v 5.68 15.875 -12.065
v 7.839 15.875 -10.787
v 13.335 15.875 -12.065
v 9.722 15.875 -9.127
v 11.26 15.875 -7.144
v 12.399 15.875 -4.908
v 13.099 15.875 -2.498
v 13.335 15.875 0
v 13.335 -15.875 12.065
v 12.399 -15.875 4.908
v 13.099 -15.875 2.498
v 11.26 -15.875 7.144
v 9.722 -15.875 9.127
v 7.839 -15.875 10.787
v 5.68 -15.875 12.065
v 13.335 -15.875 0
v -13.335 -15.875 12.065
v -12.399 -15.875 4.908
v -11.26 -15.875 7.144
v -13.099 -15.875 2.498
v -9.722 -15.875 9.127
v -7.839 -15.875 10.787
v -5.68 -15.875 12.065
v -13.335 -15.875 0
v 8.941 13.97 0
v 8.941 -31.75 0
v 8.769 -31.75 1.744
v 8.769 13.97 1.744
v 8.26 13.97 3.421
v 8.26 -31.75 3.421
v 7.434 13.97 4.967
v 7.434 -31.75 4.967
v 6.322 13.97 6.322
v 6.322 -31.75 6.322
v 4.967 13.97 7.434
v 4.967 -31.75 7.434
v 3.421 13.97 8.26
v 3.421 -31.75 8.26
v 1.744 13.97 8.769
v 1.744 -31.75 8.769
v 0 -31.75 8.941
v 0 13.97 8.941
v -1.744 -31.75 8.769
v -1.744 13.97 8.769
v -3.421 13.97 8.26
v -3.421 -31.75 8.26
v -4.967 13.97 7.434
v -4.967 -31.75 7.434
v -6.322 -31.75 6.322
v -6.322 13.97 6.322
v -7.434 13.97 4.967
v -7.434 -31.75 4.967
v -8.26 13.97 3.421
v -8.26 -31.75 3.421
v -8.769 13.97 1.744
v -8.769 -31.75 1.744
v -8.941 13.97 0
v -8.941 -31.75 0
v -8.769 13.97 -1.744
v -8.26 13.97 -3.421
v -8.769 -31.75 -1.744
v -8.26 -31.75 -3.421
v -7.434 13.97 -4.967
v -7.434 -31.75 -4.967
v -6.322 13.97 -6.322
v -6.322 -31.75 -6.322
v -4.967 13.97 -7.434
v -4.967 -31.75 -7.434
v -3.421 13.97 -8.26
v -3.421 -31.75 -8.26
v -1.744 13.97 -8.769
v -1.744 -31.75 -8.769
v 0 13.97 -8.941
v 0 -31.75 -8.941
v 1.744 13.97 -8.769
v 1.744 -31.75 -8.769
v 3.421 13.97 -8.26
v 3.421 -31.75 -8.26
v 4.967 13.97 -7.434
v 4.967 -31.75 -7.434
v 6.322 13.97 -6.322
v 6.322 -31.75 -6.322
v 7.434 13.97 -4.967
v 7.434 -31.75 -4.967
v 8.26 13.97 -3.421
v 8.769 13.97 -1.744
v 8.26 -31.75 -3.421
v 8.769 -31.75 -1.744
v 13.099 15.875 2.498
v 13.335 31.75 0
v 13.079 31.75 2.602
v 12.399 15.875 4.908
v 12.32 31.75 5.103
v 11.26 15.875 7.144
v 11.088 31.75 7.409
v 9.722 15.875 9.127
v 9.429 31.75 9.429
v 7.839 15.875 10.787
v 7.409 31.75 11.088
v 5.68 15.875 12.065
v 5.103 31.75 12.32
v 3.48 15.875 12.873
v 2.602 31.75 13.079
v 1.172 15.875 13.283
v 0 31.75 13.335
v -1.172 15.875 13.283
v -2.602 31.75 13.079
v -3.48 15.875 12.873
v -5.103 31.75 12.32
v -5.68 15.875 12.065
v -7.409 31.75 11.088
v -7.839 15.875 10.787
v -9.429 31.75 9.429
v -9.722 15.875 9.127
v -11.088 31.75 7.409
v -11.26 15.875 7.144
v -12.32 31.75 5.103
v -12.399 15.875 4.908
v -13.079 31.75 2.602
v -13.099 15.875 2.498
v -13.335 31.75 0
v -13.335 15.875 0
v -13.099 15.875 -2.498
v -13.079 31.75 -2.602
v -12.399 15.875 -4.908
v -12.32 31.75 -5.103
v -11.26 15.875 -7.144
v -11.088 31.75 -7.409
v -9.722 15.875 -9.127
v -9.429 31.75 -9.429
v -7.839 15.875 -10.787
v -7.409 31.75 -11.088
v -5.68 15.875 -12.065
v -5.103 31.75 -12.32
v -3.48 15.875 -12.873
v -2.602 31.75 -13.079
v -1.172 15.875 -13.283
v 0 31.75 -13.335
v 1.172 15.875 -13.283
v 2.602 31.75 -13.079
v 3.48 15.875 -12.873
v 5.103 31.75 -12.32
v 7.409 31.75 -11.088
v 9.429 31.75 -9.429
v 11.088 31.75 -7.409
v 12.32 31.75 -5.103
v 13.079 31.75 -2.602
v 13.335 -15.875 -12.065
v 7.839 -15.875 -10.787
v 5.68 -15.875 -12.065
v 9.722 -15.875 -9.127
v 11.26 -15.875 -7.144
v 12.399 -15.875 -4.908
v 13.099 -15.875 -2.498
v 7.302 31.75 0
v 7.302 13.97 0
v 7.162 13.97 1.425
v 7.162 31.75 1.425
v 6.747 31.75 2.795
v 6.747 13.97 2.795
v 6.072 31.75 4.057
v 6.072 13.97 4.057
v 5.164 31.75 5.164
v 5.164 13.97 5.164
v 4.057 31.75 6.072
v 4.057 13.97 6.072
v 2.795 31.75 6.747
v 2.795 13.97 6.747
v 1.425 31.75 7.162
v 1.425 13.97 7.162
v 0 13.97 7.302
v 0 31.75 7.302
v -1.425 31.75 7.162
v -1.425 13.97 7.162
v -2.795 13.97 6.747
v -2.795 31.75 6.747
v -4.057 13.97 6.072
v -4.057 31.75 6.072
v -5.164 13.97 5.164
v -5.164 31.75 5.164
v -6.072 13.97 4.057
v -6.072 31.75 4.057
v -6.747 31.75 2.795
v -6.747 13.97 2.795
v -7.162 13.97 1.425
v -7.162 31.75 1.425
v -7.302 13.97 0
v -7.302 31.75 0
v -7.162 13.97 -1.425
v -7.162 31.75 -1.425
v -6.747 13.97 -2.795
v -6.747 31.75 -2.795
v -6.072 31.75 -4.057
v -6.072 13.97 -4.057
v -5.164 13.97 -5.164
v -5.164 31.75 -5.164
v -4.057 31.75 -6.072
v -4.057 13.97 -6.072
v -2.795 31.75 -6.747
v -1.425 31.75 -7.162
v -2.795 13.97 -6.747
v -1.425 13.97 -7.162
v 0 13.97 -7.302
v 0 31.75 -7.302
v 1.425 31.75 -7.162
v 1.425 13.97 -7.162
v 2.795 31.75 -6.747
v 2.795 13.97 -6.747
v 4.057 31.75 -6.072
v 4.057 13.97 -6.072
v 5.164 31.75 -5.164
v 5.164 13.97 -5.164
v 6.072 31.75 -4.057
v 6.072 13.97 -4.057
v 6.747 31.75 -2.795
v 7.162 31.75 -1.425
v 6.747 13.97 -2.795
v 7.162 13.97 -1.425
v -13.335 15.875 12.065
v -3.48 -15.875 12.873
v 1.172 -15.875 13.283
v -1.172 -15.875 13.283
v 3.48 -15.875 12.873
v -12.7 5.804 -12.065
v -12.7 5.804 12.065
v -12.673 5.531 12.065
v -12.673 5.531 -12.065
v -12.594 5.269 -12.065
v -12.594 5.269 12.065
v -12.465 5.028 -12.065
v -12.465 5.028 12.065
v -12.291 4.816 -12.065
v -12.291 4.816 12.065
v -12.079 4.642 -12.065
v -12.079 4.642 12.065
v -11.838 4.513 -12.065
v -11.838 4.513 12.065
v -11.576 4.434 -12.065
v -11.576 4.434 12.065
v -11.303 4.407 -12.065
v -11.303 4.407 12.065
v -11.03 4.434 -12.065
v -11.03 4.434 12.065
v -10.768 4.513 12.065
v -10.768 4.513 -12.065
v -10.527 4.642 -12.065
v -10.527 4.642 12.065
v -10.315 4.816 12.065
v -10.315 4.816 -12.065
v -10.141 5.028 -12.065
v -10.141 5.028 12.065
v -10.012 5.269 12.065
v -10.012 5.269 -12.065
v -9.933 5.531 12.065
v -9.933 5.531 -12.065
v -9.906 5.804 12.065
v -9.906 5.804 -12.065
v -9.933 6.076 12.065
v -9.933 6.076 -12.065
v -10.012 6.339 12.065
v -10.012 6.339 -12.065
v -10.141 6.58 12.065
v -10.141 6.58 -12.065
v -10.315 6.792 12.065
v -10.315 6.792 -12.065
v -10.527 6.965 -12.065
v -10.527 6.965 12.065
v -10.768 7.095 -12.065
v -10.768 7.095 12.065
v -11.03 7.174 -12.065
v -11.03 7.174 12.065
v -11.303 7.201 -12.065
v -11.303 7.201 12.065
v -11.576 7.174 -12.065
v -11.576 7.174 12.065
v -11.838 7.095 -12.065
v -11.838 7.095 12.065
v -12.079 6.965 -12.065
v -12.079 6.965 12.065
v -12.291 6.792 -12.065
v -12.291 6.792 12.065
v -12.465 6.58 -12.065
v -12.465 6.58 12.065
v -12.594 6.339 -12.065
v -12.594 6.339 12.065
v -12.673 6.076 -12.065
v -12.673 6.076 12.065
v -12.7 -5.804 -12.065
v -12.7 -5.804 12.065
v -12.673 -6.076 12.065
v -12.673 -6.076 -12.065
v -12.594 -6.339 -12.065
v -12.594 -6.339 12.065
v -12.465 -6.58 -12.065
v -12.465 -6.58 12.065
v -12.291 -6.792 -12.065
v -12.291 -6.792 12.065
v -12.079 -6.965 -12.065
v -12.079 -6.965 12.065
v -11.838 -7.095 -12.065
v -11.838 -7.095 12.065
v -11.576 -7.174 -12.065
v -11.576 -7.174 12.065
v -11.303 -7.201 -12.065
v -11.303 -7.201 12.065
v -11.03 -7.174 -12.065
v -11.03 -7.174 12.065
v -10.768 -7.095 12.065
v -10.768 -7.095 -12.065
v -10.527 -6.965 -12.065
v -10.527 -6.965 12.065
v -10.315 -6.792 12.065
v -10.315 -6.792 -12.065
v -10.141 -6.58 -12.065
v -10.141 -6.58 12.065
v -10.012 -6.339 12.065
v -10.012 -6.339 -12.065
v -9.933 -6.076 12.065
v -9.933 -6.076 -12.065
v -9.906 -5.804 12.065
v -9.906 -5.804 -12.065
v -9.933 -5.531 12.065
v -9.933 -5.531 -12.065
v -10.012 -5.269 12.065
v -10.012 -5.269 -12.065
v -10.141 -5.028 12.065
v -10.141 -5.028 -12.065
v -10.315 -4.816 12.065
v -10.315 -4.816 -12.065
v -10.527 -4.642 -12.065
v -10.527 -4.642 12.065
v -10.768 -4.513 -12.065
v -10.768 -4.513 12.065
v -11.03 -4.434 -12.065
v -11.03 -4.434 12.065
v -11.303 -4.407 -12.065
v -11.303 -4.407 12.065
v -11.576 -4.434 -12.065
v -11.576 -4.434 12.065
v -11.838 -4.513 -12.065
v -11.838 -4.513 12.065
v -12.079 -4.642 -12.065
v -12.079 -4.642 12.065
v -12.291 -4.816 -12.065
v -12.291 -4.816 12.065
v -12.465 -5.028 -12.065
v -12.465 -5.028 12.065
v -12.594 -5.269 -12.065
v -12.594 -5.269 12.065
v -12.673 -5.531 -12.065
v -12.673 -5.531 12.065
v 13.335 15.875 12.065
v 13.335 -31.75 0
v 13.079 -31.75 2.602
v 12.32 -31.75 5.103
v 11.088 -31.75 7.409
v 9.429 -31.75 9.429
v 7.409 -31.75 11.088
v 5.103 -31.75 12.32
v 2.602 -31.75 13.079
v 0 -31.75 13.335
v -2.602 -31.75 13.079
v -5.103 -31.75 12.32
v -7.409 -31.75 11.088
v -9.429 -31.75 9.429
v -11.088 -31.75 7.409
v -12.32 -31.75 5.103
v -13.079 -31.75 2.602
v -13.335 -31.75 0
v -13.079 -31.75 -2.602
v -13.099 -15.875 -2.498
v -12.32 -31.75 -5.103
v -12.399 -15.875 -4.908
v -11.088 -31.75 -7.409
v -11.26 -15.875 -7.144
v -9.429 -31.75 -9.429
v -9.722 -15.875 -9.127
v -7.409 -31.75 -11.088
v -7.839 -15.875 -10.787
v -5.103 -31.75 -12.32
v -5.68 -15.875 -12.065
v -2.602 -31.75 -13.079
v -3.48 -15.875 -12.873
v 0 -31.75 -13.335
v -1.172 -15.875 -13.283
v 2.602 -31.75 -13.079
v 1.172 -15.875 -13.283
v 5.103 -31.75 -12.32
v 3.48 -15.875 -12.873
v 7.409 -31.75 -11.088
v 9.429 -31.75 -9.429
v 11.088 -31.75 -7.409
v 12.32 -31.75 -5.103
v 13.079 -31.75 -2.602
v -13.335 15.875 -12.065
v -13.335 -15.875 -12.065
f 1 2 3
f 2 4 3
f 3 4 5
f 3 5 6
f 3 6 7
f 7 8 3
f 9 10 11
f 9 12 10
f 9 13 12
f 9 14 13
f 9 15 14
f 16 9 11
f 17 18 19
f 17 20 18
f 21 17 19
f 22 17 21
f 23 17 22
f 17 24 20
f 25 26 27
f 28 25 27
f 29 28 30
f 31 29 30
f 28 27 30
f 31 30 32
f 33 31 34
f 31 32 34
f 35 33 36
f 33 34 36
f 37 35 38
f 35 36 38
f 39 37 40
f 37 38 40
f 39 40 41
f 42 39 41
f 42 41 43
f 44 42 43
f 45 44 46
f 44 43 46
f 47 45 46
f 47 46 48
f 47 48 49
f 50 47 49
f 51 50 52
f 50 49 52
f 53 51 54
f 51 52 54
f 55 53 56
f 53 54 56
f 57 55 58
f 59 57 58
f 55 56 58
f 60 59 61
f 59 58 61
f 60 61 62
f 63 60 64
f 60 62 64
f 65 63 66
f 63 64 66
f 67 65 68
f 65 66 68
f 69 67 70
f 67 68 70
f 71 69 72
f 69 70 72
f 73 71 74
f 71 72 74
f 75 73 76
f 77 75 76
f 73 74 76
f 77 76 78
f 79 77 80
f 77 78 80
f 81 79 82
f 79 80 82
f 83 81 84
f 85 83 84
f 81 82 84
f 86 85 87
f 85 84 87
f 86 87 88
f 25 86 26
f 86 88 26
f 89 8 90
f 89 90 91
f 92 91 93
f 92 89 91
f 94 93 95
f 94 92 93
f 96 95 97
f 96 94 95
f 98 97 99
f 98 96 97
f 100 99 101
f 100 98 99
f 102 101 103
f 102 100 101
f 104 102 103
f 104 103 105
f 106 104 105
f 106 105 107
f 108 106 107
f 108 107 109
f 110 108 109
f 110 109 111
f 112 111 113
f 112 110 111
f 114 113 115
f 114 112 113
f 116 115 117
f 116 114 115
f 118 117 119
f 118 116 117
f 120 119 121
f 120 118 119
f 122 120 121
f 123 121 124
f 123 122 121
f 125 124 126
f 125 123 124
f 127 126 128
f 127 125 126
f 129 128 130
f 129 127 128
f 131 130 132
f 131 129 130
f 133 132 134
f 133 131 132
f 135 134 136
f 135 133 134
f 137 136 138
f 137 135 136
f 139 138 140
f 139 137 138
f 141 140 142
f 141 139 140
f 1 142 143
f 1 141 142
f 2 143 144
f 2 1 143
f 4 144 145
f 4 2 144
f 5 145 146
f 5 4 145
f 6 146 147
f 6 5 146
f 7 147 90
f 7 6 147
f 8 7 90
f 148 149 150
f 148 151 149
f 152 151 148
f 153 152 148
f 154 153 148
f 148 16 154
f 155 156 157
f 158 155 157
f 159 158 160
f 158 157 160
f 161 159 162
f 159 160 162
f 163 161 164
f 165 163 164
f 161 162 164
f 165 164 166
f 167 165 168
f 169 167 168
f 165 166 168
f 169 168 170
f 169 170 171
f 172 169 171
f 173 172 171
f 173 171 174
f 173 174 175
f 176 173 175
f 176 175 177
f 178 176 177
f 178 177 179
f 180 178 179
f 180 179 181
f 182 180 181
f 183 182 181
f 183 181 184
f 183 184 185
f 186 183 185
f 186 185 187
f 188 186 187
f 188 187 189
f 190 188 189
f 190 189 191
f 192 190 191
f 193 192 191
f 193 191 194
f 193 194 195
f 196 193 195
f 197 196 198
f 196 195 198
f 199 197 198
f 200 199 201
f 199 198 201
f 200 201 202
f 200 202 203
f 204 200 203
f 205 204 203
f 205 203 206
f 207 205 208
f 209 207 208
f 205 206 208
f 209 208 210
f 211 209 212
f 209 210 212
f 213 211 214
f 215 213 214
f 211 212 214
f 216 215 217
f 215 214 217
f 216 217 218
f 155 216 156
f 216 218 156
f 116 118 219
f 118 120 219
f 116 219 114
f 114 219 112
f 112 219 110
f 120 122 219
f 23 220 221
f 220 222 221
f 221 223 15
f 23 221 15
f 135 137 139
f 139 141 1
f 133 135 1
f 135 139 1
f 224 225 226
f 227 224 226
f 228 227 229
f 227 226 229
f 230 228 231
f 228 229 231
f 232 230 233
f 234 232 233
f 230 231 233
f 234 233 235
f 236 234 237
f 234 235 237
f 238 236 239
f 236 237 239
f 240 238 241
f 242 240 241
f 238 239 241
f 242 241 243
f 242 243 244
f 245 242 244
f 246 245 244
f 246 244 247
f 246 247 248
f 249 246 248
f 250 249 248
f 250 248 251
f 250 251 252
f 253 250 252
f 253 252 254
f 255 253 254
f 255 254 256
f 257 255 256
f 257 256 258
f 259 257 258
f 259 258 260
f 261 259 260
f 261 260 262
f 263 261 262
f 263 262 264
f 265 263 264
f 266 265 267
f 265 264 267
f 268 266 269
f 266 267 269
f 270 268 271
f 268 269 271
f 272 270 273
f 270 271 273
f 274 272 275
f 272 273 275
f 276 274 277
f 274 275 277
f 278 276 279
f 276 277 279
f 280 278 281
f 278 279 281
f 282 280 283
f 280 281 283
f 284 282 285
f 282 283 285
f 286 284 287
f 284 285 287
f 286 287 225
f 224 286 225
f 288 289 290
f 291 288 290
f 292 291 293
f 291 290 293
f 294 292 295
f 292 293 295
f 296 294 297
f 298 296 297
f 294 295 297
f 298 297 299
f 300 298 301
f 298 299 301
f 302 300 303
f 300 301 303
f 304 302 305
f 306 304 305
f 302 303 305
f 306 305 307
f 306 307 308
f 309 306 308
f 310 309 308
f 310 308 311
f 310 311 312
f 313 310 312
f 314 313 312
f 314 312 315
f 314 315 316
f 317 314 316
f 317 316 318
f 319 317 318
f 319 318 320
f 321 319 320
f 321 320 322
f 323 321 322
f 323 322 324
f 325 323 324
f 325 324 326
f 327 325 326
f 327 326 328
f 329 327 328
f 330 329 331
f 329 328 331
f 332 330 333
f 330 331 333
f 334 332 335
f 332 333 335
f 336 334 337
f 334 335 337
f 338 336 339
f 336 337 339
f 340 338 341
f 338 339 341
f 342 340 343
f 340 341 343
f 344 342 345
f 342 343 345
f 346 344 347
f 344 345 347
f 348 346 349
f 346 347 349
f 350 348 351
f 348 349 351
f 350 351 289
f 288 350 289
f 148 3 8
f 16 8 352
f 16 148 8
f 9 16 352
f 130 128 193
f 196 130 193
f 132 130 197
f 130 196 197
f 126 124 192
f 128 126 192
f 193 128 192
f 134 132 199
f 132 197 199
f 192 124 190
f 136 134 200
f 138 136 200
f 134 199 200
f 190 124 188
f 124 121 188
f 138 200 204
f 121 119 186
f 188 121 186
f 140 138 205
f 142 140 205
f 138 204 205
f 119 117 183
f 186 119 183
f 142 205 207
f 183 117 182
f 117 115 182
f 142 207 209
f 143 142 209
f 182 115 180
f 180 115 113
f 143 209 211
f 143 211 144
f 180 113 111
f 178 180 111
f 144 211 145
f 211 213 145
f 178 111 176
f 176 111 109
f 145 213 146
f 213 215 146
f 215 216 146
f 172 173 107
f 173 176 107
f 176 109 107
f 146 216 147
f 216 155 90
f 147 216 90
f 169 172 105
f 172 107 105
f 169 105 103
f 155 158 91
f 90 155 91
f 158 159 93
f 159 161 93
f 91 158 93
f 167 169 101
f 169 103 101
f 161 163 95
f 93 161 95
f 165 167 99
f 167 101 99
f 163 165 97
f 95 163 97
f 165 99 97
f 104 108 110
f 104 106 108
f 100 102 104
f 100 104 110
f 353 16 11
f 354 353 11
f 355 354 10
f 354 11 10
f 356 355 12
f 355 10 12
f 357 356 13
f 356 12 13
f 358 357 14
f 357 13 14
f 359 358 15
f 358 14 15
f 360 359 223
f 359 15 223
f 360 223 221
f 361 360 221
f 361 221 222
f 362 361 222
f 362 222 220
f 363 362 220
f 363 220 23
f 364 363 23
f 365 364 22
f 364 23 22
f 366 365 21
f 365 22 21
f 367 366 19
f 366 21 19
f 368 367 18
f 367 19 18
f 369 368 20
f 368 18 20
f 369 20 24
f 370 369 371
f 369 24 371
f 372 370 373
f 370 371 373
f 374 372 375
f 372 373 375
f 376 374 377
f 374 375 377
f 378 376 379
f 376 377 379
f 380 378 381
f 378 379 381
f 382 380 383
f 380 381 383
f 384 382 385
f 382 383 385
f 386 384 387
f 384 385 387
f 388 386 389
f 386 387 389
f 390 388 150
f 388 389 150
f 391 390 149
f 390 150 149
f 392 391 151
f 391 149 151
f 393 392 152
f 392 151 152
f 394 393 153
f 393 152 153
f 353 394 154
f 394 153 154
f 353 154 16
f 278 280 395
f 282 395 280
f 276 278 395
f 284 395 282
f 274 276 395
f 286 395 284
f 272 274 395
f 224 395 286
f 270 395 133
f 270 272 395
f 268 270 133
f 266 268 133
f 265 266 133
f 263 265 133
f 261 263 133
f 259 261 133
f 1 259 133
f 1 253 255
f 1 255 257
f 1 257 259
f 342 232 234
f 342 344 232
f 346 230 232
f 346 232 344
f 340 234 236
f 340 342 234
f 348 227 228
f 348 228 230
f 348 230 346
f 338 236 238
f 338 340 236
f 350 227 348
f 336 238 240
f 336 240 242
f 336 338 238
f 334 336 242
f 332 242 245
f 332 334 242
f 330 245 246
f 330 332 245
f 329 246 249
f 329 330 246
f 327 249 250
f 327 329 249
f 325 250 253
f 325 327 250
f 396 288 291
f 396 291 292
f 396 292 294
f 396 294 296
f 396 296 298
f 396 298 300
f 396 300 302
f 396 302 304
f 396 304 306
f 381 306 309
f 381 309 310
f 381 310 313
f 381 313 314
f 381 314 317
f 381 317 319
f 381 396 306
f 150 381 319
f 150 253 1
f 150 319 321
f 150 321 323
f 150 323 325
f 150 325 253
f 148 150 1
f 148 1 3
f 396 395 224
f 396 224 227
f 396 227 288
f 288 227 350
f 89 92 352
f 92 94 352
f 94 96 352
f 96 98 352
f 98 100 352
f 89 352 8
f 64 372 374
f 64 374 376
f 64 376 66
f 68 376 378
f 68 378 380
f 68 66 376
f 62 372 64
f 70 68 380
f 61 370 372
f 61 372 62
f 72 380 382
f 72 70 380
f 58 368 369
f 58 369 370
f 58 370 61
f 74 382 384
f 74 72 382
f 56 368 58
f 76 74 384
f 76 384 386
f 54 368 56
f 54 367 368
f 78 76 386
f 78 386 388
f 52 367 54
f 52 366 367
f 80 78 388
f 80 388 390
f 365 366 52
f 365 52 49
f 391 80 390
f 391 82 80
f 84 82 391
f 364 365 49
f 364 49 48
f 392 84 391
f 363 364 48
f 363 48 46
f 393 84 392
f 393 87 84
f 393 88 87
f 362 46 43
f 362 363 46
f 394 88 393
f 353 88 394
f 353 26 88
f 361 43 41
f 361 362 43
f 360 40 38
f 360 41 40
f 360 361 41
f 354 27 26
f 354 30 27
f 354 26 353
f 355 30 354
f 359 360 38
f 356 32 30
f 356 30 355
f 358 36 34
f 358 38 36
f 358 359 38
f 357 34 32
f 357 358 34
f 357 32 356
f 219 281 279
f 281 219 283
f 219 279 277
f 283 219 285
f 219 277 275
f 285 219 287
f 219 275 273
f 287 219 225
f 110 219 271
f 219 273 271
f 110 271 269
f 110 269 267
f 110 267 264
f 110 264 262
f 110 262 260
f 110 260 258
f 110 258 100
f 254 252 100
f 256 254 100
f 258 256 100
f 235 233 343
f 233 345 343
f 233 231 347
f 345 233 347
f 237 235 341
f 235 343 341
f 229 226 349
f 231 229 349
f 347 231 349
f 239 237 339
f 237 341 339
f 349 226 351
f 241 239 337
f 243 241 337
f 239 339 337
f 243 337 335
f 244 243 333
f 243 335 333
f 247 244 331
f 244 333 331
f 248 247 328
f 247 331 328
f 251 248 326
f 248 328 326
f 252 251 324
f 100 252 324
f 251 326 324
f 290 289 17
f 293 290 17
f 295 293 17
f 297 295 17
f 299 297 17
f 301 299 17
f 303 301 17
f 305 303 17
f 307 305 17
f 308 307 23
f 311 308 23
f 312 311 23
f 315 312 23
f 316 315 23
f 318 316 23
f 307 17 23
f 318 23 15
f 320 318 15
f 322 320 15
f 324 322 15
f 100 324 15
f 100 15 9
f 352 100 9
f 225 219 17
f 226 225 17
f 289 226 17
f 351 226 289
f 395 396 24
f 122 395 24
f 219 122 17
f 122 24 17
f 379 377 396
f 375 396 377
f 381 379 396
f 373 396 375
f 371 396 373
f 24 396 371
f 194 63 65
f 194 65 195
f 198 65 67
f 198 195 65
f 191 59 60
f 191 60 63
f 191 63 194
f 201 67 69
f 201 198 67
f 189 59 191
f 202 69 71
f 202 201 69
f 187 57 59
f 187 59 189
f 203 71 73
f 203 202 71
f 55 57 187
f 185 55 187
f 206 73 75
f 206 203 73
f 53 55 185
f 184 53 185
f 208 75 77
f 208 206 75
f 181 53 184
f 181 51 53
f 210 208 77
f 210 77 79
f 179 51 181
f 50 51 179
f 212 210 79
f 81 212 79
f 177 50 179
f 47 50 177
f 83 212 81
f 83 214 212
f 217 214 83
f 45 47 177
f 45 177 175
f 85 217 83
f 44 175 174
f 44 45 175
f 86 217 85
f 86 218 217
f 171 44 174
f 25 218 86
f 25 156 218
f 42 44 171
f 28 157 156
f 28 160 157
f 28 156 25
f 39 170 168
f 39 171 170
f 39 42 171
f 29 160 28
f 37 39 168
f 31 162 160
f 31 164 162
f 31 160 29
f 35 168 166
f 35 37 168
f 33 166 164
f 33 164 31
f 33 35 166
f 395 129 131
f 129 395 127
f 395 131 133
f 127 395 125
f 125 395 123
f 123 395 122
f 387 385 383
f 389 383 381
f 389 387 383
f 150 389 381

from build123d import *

# Parameters (mm, degrees)
F5_W      = 26.67
F5_H      = 26.67
F6_DEPTH  = 31.75
F7_R      = 13.335
F9_DEPTH  = 15.875
F8_R      = 13.335
F10_DEPTH = 15.875
F12_R     = 7.3025
F14_DEPTH = 63.5
F11_R     = 8.9408
F15_DEPTH = 45.72
F13_R     = 7.3025
F16_DEPTH = 63.5
F18_D     = 2.794
F19_D     = 2.794
F20_DEPTH = 1.27
F21_DEPTH = 1.27


with BuildPart() as f6:
    # F5 (on offset) → F6 (new body)
    with BuildSketch(Plane.XZ.offset(15.875)):
        Rectangle(F5_W, F5_H)
    extrude(amount=-F6_DEPTH)

    # F7 (on offset) → F9 (join)
    with BuildSketch(Plane.XZ.offset(15.875)):
        Circle(F7_R)
    extrude(amount=F9_DEPTH)

    # F8 (on offset) → F10 (join)
    with BuildSketch(Plane.XZ.offset(-15.875)):
        Circle(F8_R)
    extrude(amount=-F10_DEPTH)

    # F12 (on offset) → F14 (cut)
    with BuildSketch(Plane.XZ.offset(31.75)):
        Circle(F12_R)
    extrude(amount=-F14_DEPTH, mode=Mode.SUBTRACT)

    # F11 (on offset) → F15 (cut)
    with BuildSketch(Plane.XZ.offset(31.75)):
        Circle(F11_R)
    extrude(amount=-F15_DEPTH, mode=Mode.SUBTRACT)

    # F13 (on offset) → F16 (cut)
    with BuildSketch(Plane.XZ.offset(-31.75)):
        Circle(F13_R)
    extrude(amount=F16_DEPTH, mode=Mode.SUBTRACT)

    # F18 (through all)
    with Locations(Plane(origin=(0, 0, -13.335), x_dir=(1, 0, 0), z_dir=(0, 0, -1))):
        with Locations((-11.303, -5.8039)):
            Hole(F18_D / 2)

    # F19 (through all)
    with Locations(Plane(origin=(0, 0, -13.335), x_dir=(1, 0, 0), z_dir=(0, 0, -1))):
        with Locations((-11.303, 5.8039)):
            Hole(F19_D / 2)

    # F20 (cut): a face of the model
    f20_faces = [f6.faces().sort_by_distance(p)[0] for p in [
        (0.166086667, 0, 13.335),
    ]]
    extrude(f20_faces, amount=-F20_DEPTH, mode=Mode.SUBTRACT)

    # F21 (cut): a face of the model
    f21_faces = [f6.faces().sort_by_distance(p)[0] for p in [
        (0.166086667, 0, -13.335),
    ]]
    extrude(f21_faces, amount=-F21_DEPTH, mode=Mode.SUBTRACT)


solid = f6.part
